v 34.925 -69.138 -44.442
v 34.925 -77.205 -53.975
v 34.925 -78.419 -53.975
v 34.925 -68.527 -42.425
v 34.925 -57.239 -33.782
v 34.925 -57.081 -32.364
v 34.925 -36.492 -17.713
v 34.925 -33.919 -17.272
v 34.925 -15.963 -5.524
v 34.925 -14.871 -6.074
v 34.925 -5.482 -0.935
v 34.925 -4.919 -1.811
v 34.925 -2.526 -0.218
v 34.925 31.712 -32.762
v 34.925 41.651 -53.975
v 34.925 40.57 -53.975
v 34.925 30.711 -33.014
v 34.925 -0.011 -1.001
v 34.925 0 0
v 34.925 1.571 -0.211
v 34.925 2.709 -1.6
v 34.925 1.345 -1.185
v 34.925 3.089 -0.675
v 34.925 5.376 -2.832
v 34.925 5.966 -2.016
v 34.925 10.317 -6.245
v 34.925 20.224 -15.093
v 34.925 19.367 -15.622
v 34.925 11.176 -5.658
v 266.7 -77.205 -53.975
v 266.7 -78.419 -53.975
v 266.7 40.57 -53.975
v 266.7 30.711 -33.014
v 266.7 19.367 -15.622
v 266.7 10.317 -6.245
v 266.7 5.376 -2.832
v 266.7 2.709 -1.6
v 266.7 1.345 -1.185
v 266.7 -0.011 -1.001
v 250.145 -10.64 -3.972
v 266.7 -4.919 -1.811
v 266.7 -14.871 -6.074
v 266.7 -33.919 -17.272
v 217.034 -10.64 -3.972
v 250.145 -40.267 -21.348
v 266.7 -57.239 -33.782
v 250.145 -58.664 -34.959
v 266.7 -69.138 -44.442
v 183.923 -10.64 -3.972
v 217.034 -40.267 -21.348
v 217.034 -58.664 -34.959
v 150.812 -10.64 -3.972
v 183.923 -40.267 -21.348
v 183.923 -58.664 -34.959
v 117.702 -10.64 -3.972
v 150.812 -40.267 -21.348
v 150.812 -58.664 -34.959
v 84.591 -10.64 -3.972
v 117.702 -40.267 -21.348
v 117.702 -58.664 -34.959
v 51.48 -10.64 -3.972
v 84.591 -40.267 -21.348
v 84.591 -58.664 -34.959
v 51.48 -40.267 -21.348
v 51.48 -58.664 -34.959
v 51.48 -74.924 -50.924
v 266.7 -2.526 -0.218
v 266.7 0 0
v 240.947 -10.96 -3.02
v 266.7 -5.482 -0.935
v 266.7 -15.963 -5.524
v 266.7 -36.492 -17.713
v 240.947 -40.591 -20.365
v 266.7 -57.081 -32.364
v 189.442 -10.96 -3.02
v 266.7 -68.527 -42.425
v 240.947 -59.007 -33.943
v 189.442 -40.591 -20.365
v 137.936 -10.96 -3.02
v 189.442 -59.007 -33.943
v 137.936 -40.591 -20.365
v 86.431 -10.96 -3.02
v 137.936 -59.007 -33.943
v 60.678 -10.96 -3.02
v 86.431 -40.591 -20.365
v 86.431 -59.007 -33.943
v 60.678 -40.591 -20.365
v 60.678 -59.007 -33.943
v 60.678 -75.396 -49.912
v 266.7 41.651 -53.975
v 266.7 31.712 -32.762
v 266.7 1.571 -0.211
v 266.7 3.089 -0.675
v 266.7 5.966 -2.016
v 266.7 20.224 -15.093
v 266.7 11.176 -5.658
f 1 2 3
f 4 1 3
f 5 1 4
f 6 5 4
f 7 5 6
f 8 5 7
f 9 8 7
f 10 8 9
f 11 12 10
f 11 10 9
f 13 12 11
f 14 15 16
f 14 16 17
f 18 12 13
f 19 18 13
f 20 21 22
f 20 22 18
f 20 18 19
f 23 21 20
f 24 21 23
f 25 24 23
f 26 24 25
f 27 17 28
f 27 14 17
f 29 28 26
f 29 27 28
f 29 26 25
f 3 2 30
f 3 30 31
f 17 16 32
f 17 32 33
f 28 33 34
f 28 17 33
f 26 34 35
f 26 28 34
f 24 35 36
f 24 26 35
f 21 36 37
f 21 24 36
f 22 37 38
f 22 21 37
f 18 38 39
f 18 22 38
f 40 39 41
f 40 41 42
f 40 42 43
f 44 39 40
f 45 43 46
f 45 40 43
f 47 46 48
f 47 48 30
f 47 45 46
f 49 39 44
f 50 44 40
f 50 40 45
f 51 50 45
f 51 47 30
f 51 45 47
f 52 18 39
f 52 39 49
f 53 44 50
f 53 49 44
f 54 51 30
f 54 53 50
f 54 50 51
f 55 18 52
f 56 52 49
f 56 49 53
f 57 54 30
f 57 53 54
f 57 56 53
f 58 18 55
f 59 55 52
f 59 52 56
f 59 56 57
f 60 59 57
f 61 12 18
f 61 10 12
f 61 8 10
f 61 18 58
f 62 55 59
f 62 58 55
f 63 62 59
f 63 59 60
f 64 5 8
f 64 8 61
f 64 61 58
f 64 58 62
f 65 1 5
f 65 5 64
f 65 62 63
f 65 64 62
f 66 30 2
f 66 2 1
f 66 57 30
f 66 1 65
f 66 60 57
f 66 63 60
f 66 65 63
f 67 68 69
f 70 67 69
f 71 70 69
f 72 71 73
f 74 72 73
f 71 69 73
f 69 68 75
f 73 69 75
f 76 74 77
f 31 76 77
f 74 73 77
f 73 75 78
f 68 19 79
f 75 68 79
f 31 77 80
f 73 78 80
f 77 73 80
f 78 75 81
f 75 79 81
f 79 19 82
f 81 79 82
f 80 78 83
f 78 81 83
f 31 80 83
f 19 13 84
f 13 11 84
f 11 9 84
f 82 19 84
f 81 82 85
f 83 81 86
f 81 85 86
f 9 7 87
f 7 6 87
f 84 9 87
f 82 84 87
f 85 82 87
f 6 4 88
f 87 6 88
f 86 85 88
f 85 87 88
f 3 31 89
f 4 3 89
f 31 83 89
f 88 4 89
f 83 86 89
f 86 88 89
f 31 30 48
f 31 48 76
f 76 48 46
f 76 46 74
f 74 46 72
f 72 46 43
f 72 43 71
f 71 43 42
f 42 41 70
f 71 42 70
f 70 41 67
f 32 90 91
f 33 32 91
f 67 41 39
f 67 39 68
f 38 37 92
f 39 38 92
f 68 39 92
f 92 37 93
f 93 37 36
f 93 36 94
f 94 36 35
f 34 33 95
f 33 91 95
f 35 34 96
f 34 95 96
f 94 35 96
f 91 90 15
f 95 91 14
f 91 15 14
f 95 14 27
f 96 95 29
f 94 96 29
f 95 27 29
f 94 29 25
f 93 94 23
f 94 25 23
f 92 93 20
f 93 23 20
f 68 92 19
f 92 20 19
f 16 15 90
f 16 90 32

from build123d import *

# Parameters (mm, degrees)
BOSS_EXTRUDE1_DEPTH = 231.775


with BuildPart() as part:
    # Sketch1 → Boss-Extrude1 (new body)
    with BuildSketch(Plane.ZY.offset(-34.925)):
        with BuildLine():
            Line((-53.975, -77.204508027), (-53.975, -78.419412207))
            add(Edge.make_bspline(
                [(0, 0), (-0.017452033, -0.519005663), (-0.06166203, -1.833765907), (-0.570189515, -4.396811557), (-2.53612962, -10.616386462), (-7.9982118, -20.550135555), (-16.1136536, -34.184951823), (-25.751267724, -48.900160958), (-36.932012921, -62.938772264), (-46.457496122, -72.906141172), (-52.583490281, -77.46023067), (-53.975, -78.419412207)],
                knots=[0, 0, 0, 0, 0.001820909, 0.00461278, 0.00913453, 0.024675939, 0.044152768, 0.064937103, 0.086320988, 0.107137618, 0.113056669, 0.113056669, 0.113056669, 0.113056669], degree=3))
            add(Edge.make_bspline(
                [(-53.975, 41.651039403), (-50.709199496, 40.322947817), (-41.673766417, 36.430233183), (-28.158616929, 29.509232905), (-14.871033111, 20.557827015), (-6.144191432, 12.313264357), (-1.948102578, 6.176486601), (-0.639134364, 3.084122633), (-0.217045478, 1.668030347), (-0.042563089, 0.777840261), (-0.010742005, 0.196310087), (0, 0)],
                knots=[0.915751061, 0.915751061, 0.915751061, 0.915751061, 0.928425323, 0.951113046, 0.970252676, 0.985871491, 0.993981784, 0.996752649, 0.997906779, 0.999293381, 1, 1, 1, 1], degree=3))
            Line((-53.975, 41.651039403), (-53.975, 40.570467669))
            add(Edge.make_bspline(
                [(-53.975, 40.570467669), (-52.223886058, 39.855098624), (-46.55545684, 37.466004168), (-37.125856967, 33.052667662), (-27.830126078, 27.881861429), (-20.719091852, 23.242104552), (-15.614495512, 19.455137028), (-10.786663524, 15.322063664), (-6.429543979, 10.752121577), (-3.329781232, 6.520651809), (-1.766394253, 3.289416468), (-1.234579927, 1.629552357), (-1.070917704, 0.808496148), (-1.022680145, 0.373573872), (-1.00777339, 0.114040658), (-1.00092143, -0.010571576)],
                knots=[0.916241011, 0.916241011, 0.916241011, 0.916241011, 0.923068013, 0.938443772, 0.953819531, 0.961507411, 0.96919529, 0.97688317, 0.98457105, 0.992258929, 0.996102869, 0.998024839, 0.998985824, 0.999466316, 0.999946809, 0.999946809, 0.999946809, 0.999946809], degree=3))
            add(Edge.make_bspline(
                [(-1.00092143, -0.010571576), (-1.009923866, -0.277884036), (-1.028927427, -0.823363497), (-1.102768583, -1.825860344), (-1.416760314, -3.597204949), (-2.45215177, -7.203197251), (-4.557690792, -12.131446446), (-7.694252843, -17.87383852), (-12.081452023, -25.466401501), (-17.732189245, -34.79647061), (-24.919919042, -45.768224894), (-31.457640354, -54.481000173), (-37.047635253, -61.18254607), (-42.853610743, -67.720036372), (-48.449554365, -73.119796986), (-52.936471607, -76.472448044), (-53.975, -77.204508027)],
                knots=[5.1727e-05, 5.1727e-05, 5.1727e-05, 5.1727e-05, 0.001013083, 0.00197444, 0.003897153, 0.007742579, 0.015433432, 0.023124285, 0.030815138, 0.046196844, 0.06157855, 0.076960256, 0.084651109, 0.092341962, 0.107723668, 0.112236216, 0.112236216, 0.112236216, 0.112236216], degree=3))
        make_face()
    extrude(amount=-BOSS_EXTRUDE1_DEPTH)


solid = part.part
